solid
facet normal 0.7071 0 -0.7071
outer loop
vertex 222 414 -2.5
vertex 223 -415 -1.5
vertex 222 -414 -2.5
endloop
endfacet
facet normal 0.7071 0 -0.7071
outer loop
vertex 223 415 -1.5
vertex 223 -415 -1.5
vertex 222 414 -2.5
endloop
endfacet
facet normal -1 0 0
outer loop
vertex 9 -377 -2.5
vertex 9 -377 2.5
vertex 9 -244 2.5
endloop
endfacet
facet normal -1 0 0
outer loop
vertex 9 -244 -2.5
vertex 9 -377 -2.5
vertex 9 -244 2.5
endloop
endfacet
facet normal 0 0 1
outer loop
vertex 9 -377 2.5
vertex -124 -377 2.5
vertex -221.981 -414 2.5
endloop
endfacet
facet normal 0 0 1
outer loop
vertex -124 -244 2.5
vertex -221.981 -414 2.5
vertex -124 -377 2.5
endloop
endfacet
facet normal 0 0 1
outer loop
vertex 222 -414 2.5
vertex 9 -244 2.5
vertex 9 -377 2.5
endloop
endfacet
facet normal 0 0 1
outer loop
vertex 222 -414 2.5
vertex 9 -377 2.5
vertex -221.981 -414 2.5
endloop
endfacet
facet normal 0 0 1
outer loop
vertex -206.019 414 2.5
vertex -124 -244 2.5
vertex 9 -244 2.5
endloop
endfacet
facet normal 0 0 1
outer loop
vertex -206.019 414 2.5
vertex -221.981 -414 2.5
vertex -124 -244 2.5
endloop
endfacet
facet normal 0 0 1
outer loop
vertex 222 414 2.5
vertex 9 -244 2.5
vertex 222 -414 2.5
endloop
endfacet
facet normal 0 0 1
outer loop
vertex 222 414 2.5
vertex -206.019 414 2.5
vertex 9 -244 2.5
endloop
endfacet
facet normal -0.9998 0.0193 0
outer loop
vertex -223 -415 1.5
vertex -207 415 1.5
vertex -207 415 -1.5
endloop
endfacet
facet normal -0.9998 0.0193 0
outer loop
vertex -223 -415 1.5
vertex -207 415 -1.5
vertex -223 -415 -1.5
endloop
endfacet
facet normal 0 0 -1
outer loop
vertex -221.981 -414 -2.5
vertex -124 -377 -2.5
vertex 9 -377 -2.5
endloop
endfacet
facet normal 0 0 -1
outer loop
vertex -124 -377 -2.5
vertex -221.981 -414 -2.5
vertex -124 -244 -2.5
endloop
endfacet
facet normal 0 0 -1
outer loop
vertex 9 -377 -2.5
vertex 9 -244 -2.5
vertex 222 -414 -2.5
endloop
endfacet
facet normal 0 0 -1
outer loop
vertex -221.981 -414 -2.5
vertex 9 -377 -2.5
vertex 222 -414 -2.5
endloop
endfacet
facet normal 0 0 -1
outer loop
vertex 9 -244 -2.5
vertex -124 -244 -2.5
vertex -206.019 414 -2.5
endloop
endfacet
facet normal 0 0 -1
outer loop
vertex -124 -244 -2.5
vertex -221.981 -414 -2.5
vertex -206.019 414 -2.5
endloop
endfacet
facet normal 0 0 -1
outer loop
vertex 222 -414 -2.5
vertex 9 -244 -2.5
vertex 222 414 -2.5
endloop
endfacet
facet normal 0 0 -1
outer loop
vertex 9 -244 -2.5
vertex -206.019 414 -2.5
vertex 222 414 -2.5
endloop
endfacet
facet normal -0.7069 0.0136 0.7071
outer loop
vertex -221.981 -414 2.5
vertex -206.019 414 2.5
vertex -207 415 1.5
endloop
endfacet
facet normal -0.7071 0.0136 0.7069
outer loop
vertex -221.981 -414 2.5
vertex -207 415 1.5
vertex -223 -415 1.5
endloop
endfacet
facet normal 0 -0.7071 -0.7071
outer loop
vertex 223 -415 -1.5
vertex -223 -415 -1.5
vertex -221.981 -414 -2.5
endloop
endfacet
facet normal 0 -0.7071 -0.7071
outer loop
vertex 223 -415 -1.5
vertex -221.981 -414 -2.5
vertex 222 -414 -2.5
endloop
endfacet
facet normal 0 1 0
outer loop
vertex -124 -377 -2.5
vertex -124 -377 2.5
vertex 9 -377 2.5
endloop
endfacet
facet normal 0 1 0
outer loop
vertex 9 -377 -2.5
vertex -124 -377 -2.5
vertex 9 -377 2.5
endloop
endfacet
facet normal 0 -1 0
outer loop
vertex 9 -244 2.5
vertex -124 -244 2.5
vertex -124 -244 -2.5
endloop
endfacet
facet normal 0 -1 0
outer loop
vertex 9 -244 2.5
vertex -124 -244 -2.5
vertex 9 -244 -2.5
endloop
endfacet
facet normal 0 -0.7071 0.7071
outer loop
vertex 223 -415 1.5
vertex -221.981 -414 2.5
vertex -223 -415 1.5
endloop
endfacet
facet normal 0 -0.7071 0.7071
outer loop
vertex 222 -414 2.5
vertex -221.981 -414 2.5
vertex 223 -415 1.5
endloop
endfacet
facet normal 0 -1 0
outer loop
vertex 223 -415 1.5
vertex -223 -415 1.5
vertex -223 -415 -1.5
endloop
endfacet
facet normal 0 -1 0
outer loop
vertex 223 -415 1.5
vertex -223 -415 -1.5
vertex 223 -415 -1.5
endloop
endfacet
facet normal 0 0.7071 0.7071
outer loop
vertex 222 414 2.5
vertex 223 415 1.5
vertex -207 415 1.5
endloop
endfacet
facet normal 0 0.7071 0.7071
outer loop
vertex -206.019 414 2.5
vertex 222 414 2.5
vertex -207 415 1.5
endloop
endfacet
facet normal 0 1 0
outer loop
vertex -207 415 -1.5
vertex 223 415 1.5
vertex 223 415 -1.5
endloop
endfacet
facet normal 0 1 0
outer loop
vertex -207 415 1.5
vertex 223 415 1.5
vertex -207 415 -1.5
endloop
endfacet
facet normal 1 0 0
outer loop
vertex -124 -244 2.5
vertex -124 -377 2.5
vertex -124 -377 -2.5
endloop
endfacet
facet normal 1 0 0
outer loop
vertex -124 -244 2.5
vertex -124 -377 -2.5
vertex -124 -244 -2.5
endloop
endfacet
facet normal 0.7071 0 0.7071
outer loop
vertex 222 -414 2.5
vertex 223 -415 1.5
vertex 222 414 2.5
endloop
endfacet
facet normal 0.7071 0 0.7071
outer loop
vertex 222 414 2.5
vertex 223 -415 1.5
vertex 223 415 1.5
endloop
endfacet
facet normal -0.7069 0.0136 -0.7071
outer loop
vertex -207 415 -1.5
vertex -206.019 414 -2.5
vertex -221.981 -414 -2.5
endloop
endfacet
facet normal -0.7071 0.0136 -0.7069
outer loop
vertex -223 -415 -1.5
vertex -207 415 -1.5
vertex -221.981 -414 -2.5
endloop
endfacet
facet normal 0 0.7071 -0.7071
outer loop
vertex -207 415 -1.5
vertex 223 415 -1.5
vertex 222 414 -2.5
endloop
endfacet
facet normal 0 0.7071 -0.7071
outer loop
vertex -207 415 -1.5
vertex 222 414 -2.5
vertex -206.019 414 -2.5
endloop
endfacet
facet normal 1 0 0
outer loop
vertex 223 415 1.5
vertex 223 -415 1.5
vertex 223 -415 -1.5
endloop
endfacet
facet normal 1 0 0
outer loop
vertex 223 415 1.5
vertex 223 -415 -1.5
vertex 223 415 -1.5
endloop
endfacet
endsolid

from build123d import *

# Parameters (mm, degrees)
F1_DEPTH = 2.5
F2_W     = 133
F2_H     = 133
F3_DEPTH = 5.001
F4_SIZE  = 1


with BuildPart() as f1:
    # F0 (on Top) → F1 (new body, symmetric)
    with BuildSketch(Plane.XY):
        Polygon((-207, 415), (-223, -415), (223, -415), (223, 415), align=None)
    extrude(amount=F1_DEPTH, both=True)

    # F2 (on face) → F3 (cut, through all)
    with BuildSketch(Plane.XY.offset(2.5)):
        with Locations((-57.5, -310.5)):
            Rectangle(F2_W, F2_H)
    extrude(amount=-F3_DEPTH, mode=Mode.SUBTRACT)

    # F4
    f4_edges = [f1.edges().sort_by_distance(p)[0] for p in [
        (-215, 0, 2.5),
        (-215, 0, -2.5),
        (8, 415, 2.5),
        (8, 415, -2.5),
        (223, 0, 2.5),
        (223, 0, -2.5),
        (0, -415, 2.5),
        (0, -415, -2.5),
    ]]
    chamfer(f4_edges, length=F4_SIZE)


solid = f1.part
